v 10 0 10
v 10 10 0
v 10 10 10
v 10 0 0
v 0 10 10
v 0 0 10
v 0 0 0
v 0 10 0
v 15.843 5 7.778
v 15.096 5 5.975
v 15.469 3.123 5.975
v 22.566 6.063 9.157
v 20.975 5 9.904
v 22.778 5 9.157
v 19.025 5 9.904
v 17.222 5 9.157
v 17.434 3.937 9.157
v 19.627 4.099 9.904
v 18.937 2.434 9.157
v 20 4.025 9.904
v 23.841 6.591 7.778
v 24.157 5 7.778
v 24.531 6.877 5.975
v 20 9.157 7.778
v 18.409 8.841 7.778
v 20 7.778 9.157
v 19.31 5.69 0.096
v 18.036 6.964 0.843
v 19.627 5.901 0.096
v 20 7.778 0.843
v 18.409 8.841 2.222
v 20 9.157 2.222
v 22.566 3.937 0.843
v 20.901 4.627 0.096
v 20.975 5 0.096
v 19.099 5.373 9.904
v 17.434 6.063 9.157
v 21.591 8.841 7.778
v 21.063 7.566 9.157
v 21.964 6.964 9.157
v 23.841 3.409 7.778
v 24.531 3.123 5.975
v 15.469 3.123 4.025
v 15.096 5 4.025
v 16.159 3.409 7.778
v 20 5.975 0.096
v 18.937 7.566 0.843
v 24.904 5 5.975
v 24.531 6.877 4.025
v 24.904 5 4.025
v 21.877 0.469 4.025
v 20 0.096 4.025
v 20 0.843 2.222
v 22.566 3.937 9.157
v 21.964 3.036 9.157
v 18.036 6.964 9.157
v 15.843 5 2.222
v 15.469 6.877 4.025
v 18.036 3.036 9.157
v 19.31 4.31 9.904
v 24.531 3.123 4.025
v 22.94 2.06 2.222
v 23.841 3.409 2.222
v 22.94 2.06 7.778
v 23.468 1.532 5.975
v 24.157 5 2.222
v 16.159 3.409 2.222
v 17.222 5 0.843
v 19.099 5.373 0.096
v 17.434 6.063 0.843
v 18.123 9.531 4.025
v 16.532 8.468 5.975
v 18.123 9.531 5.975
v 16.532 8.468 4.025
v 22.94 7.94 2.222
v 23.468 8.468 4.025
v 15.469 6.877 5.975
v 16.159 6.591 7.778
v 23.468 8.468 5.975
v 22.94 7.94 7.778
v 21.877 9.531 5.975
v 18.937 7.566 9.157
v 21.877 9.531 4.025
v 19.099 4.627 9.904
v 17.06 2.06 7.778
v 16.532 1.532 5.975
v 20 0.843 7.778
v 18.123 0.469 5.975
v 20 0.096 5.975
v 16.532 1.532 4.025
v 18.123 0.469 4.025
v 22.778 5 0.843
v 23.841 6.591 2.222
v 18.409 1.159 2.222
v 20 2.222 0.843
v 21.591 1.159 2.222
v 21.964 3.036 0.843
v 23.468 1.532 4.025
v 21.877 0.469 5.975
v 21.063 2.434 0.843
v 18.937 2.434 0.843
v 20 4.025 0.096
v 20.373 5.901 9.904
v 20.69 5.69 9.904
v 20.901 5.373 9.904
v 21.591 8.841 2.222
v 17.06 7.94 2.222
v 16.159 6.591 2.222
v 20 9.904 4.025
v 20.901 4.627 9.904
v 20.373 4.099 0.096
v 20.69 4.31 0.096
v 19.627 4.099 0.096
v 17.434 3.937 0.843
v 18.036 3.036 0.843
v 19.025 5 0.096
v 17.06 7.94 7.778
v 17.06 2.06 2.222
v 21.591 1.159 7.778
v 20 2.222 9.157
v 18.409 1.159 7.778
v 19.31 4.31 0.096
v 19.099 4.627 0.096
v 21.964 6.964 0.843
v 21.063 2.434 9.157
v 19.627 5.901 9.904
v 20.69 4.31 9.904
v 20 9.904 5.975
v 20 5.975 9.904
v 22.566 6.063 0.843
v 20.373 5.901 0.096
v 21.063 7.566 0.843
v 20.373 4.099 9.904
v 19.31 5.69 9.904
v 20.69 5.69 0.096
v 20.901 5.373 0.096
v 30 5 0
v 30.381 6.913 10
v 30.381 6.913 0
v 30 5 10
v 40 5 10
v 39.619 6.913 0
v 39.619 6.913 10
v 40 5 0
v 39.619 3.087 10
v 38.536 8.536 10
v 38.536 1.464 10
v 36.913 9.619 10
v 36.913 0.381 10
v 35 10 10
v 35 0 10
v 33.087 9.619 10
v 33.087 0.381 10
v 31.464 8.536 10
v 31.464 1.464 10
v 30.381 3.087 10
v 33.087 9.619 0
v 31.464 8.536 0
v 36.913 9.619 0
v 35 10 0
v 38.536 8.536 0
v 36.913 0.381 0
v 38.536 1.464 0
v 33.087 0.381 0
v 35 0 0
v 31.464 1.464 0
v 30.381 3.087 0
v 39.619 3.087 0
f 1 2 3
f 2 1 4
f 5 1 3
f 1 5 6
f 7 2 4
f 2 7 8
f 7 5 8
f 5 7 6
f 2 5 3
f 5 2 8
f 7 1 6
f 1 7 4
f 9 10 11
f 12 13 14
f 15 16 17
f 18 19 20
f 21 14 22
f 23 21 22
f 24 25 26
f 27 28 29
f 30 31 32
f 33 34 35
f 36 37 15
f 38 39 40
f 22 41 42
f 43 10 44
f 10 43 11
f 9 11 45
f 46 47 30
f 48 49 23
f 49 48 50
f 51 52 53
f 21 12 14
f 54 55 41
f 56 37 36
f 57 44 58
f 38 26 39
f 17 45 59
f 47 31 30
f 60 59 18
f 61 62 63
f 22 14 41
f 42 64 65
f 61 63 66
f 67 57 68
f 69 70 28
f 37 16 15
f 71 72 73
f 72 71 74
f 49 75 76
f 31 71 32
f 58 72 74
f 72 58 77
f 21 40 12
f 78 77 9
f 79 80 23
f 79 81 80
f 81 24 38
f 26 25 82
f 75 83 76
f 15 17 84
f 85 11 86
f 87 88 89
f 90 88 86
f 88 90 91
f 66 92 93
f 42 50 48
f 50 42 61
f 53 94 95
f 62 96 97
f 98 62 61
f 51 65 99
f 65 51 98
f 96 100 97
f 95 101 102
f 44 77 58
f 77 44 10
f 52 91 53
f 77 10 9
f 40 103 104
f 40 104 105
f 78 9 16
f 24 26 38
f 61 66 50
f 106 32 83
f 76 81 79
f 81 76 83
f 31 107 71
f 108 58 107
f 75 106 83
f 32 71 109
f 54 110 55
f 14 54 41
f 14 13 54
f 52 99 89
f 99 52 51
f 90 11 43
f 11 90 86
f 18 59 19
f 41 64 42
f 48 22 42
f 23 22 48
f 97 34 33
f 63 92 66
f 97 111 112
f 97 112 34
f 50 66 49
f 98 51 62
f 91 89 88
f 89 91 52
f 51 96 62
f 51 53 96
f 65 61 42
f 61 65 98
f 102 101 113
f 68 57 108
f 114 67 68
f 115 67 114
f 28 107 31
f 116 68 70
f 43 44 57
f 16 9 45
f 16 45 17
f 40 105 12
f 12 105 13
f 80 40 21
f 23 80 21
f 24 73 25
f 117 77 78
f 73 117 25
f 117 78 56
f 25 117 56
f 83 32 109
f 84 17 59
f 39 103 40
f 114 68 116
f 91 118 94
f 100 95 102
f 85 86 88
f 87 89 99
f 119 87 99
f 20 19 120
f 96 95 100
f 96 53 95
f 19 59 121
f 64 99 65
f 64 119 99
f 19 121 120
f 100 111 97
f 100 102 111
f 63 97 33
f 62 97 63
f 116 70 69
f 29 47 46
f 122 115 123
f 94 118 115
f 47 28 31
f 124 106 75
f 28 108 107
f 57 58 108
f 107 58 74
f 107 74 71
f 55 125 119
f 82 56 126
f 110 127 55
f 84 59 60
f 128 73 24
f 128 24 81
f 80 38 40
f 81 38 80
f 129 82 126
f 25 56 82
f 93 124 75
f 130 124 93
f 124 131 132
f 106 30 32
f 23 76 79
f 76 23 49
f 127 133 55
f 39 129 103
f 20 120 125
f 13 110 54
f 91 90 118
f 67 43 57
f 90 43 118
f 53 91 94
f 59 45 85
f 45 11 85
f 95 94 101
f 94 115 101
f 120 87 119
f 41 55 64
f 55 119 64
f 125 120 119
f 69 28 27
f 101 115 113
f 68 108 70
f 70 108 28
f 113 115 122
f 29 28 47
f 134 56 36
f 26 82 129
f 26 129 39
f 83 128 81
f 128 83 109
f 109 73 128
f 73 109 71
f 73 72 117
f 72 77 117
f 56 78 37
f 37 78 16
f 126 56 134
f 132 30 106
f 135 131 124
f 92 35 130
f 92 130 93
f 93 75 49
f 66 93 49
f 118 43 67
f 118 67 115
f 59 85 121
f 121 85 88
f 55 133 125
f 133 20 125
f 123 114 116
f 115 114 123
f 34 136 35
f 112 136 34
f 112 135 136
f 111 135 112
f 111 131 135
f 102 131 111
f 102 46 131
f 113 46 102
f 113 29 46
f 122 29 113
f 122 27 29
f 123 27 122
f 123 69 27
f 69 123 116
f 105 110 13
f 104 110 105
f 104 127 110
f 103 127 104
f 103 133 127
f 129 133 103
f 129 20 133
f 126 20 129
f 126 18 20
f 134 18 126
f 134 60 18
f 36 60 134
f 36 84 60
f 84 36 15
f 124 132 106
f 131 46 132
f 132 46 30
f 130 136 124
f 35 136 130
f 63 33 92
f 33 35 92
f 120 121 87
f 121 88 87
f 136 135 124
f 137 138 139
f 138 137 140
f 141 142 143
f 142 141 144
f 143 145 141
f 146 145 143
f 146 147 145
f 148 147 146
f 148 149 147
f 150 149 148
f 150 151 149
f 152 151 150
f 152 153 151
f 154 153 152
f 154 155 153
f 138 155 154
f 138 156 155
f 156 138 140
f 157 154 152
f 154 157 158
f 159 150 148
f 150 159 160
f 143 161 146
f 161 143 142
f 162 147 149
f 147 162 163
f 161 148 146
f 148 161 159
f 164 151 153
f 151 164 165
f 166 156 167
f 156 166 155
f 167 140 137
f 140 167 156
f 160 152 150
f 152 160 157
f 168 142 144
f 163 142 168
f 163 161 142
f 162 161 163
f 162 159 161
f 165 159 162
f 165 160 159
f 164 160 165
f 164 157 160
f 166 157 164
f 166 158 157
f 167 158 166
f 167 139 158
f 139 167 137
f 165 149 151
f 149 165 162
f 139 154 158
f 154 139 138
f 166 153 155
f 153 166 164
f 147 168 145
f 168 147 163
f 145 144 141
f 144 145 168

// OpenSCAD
translate([0,0,0]) {
    cube(10);
}

translate([20,5,5]) {
    sphere(5);
}

translate([35,5,0]) {
    cylinder(10, 5, 5);
}
